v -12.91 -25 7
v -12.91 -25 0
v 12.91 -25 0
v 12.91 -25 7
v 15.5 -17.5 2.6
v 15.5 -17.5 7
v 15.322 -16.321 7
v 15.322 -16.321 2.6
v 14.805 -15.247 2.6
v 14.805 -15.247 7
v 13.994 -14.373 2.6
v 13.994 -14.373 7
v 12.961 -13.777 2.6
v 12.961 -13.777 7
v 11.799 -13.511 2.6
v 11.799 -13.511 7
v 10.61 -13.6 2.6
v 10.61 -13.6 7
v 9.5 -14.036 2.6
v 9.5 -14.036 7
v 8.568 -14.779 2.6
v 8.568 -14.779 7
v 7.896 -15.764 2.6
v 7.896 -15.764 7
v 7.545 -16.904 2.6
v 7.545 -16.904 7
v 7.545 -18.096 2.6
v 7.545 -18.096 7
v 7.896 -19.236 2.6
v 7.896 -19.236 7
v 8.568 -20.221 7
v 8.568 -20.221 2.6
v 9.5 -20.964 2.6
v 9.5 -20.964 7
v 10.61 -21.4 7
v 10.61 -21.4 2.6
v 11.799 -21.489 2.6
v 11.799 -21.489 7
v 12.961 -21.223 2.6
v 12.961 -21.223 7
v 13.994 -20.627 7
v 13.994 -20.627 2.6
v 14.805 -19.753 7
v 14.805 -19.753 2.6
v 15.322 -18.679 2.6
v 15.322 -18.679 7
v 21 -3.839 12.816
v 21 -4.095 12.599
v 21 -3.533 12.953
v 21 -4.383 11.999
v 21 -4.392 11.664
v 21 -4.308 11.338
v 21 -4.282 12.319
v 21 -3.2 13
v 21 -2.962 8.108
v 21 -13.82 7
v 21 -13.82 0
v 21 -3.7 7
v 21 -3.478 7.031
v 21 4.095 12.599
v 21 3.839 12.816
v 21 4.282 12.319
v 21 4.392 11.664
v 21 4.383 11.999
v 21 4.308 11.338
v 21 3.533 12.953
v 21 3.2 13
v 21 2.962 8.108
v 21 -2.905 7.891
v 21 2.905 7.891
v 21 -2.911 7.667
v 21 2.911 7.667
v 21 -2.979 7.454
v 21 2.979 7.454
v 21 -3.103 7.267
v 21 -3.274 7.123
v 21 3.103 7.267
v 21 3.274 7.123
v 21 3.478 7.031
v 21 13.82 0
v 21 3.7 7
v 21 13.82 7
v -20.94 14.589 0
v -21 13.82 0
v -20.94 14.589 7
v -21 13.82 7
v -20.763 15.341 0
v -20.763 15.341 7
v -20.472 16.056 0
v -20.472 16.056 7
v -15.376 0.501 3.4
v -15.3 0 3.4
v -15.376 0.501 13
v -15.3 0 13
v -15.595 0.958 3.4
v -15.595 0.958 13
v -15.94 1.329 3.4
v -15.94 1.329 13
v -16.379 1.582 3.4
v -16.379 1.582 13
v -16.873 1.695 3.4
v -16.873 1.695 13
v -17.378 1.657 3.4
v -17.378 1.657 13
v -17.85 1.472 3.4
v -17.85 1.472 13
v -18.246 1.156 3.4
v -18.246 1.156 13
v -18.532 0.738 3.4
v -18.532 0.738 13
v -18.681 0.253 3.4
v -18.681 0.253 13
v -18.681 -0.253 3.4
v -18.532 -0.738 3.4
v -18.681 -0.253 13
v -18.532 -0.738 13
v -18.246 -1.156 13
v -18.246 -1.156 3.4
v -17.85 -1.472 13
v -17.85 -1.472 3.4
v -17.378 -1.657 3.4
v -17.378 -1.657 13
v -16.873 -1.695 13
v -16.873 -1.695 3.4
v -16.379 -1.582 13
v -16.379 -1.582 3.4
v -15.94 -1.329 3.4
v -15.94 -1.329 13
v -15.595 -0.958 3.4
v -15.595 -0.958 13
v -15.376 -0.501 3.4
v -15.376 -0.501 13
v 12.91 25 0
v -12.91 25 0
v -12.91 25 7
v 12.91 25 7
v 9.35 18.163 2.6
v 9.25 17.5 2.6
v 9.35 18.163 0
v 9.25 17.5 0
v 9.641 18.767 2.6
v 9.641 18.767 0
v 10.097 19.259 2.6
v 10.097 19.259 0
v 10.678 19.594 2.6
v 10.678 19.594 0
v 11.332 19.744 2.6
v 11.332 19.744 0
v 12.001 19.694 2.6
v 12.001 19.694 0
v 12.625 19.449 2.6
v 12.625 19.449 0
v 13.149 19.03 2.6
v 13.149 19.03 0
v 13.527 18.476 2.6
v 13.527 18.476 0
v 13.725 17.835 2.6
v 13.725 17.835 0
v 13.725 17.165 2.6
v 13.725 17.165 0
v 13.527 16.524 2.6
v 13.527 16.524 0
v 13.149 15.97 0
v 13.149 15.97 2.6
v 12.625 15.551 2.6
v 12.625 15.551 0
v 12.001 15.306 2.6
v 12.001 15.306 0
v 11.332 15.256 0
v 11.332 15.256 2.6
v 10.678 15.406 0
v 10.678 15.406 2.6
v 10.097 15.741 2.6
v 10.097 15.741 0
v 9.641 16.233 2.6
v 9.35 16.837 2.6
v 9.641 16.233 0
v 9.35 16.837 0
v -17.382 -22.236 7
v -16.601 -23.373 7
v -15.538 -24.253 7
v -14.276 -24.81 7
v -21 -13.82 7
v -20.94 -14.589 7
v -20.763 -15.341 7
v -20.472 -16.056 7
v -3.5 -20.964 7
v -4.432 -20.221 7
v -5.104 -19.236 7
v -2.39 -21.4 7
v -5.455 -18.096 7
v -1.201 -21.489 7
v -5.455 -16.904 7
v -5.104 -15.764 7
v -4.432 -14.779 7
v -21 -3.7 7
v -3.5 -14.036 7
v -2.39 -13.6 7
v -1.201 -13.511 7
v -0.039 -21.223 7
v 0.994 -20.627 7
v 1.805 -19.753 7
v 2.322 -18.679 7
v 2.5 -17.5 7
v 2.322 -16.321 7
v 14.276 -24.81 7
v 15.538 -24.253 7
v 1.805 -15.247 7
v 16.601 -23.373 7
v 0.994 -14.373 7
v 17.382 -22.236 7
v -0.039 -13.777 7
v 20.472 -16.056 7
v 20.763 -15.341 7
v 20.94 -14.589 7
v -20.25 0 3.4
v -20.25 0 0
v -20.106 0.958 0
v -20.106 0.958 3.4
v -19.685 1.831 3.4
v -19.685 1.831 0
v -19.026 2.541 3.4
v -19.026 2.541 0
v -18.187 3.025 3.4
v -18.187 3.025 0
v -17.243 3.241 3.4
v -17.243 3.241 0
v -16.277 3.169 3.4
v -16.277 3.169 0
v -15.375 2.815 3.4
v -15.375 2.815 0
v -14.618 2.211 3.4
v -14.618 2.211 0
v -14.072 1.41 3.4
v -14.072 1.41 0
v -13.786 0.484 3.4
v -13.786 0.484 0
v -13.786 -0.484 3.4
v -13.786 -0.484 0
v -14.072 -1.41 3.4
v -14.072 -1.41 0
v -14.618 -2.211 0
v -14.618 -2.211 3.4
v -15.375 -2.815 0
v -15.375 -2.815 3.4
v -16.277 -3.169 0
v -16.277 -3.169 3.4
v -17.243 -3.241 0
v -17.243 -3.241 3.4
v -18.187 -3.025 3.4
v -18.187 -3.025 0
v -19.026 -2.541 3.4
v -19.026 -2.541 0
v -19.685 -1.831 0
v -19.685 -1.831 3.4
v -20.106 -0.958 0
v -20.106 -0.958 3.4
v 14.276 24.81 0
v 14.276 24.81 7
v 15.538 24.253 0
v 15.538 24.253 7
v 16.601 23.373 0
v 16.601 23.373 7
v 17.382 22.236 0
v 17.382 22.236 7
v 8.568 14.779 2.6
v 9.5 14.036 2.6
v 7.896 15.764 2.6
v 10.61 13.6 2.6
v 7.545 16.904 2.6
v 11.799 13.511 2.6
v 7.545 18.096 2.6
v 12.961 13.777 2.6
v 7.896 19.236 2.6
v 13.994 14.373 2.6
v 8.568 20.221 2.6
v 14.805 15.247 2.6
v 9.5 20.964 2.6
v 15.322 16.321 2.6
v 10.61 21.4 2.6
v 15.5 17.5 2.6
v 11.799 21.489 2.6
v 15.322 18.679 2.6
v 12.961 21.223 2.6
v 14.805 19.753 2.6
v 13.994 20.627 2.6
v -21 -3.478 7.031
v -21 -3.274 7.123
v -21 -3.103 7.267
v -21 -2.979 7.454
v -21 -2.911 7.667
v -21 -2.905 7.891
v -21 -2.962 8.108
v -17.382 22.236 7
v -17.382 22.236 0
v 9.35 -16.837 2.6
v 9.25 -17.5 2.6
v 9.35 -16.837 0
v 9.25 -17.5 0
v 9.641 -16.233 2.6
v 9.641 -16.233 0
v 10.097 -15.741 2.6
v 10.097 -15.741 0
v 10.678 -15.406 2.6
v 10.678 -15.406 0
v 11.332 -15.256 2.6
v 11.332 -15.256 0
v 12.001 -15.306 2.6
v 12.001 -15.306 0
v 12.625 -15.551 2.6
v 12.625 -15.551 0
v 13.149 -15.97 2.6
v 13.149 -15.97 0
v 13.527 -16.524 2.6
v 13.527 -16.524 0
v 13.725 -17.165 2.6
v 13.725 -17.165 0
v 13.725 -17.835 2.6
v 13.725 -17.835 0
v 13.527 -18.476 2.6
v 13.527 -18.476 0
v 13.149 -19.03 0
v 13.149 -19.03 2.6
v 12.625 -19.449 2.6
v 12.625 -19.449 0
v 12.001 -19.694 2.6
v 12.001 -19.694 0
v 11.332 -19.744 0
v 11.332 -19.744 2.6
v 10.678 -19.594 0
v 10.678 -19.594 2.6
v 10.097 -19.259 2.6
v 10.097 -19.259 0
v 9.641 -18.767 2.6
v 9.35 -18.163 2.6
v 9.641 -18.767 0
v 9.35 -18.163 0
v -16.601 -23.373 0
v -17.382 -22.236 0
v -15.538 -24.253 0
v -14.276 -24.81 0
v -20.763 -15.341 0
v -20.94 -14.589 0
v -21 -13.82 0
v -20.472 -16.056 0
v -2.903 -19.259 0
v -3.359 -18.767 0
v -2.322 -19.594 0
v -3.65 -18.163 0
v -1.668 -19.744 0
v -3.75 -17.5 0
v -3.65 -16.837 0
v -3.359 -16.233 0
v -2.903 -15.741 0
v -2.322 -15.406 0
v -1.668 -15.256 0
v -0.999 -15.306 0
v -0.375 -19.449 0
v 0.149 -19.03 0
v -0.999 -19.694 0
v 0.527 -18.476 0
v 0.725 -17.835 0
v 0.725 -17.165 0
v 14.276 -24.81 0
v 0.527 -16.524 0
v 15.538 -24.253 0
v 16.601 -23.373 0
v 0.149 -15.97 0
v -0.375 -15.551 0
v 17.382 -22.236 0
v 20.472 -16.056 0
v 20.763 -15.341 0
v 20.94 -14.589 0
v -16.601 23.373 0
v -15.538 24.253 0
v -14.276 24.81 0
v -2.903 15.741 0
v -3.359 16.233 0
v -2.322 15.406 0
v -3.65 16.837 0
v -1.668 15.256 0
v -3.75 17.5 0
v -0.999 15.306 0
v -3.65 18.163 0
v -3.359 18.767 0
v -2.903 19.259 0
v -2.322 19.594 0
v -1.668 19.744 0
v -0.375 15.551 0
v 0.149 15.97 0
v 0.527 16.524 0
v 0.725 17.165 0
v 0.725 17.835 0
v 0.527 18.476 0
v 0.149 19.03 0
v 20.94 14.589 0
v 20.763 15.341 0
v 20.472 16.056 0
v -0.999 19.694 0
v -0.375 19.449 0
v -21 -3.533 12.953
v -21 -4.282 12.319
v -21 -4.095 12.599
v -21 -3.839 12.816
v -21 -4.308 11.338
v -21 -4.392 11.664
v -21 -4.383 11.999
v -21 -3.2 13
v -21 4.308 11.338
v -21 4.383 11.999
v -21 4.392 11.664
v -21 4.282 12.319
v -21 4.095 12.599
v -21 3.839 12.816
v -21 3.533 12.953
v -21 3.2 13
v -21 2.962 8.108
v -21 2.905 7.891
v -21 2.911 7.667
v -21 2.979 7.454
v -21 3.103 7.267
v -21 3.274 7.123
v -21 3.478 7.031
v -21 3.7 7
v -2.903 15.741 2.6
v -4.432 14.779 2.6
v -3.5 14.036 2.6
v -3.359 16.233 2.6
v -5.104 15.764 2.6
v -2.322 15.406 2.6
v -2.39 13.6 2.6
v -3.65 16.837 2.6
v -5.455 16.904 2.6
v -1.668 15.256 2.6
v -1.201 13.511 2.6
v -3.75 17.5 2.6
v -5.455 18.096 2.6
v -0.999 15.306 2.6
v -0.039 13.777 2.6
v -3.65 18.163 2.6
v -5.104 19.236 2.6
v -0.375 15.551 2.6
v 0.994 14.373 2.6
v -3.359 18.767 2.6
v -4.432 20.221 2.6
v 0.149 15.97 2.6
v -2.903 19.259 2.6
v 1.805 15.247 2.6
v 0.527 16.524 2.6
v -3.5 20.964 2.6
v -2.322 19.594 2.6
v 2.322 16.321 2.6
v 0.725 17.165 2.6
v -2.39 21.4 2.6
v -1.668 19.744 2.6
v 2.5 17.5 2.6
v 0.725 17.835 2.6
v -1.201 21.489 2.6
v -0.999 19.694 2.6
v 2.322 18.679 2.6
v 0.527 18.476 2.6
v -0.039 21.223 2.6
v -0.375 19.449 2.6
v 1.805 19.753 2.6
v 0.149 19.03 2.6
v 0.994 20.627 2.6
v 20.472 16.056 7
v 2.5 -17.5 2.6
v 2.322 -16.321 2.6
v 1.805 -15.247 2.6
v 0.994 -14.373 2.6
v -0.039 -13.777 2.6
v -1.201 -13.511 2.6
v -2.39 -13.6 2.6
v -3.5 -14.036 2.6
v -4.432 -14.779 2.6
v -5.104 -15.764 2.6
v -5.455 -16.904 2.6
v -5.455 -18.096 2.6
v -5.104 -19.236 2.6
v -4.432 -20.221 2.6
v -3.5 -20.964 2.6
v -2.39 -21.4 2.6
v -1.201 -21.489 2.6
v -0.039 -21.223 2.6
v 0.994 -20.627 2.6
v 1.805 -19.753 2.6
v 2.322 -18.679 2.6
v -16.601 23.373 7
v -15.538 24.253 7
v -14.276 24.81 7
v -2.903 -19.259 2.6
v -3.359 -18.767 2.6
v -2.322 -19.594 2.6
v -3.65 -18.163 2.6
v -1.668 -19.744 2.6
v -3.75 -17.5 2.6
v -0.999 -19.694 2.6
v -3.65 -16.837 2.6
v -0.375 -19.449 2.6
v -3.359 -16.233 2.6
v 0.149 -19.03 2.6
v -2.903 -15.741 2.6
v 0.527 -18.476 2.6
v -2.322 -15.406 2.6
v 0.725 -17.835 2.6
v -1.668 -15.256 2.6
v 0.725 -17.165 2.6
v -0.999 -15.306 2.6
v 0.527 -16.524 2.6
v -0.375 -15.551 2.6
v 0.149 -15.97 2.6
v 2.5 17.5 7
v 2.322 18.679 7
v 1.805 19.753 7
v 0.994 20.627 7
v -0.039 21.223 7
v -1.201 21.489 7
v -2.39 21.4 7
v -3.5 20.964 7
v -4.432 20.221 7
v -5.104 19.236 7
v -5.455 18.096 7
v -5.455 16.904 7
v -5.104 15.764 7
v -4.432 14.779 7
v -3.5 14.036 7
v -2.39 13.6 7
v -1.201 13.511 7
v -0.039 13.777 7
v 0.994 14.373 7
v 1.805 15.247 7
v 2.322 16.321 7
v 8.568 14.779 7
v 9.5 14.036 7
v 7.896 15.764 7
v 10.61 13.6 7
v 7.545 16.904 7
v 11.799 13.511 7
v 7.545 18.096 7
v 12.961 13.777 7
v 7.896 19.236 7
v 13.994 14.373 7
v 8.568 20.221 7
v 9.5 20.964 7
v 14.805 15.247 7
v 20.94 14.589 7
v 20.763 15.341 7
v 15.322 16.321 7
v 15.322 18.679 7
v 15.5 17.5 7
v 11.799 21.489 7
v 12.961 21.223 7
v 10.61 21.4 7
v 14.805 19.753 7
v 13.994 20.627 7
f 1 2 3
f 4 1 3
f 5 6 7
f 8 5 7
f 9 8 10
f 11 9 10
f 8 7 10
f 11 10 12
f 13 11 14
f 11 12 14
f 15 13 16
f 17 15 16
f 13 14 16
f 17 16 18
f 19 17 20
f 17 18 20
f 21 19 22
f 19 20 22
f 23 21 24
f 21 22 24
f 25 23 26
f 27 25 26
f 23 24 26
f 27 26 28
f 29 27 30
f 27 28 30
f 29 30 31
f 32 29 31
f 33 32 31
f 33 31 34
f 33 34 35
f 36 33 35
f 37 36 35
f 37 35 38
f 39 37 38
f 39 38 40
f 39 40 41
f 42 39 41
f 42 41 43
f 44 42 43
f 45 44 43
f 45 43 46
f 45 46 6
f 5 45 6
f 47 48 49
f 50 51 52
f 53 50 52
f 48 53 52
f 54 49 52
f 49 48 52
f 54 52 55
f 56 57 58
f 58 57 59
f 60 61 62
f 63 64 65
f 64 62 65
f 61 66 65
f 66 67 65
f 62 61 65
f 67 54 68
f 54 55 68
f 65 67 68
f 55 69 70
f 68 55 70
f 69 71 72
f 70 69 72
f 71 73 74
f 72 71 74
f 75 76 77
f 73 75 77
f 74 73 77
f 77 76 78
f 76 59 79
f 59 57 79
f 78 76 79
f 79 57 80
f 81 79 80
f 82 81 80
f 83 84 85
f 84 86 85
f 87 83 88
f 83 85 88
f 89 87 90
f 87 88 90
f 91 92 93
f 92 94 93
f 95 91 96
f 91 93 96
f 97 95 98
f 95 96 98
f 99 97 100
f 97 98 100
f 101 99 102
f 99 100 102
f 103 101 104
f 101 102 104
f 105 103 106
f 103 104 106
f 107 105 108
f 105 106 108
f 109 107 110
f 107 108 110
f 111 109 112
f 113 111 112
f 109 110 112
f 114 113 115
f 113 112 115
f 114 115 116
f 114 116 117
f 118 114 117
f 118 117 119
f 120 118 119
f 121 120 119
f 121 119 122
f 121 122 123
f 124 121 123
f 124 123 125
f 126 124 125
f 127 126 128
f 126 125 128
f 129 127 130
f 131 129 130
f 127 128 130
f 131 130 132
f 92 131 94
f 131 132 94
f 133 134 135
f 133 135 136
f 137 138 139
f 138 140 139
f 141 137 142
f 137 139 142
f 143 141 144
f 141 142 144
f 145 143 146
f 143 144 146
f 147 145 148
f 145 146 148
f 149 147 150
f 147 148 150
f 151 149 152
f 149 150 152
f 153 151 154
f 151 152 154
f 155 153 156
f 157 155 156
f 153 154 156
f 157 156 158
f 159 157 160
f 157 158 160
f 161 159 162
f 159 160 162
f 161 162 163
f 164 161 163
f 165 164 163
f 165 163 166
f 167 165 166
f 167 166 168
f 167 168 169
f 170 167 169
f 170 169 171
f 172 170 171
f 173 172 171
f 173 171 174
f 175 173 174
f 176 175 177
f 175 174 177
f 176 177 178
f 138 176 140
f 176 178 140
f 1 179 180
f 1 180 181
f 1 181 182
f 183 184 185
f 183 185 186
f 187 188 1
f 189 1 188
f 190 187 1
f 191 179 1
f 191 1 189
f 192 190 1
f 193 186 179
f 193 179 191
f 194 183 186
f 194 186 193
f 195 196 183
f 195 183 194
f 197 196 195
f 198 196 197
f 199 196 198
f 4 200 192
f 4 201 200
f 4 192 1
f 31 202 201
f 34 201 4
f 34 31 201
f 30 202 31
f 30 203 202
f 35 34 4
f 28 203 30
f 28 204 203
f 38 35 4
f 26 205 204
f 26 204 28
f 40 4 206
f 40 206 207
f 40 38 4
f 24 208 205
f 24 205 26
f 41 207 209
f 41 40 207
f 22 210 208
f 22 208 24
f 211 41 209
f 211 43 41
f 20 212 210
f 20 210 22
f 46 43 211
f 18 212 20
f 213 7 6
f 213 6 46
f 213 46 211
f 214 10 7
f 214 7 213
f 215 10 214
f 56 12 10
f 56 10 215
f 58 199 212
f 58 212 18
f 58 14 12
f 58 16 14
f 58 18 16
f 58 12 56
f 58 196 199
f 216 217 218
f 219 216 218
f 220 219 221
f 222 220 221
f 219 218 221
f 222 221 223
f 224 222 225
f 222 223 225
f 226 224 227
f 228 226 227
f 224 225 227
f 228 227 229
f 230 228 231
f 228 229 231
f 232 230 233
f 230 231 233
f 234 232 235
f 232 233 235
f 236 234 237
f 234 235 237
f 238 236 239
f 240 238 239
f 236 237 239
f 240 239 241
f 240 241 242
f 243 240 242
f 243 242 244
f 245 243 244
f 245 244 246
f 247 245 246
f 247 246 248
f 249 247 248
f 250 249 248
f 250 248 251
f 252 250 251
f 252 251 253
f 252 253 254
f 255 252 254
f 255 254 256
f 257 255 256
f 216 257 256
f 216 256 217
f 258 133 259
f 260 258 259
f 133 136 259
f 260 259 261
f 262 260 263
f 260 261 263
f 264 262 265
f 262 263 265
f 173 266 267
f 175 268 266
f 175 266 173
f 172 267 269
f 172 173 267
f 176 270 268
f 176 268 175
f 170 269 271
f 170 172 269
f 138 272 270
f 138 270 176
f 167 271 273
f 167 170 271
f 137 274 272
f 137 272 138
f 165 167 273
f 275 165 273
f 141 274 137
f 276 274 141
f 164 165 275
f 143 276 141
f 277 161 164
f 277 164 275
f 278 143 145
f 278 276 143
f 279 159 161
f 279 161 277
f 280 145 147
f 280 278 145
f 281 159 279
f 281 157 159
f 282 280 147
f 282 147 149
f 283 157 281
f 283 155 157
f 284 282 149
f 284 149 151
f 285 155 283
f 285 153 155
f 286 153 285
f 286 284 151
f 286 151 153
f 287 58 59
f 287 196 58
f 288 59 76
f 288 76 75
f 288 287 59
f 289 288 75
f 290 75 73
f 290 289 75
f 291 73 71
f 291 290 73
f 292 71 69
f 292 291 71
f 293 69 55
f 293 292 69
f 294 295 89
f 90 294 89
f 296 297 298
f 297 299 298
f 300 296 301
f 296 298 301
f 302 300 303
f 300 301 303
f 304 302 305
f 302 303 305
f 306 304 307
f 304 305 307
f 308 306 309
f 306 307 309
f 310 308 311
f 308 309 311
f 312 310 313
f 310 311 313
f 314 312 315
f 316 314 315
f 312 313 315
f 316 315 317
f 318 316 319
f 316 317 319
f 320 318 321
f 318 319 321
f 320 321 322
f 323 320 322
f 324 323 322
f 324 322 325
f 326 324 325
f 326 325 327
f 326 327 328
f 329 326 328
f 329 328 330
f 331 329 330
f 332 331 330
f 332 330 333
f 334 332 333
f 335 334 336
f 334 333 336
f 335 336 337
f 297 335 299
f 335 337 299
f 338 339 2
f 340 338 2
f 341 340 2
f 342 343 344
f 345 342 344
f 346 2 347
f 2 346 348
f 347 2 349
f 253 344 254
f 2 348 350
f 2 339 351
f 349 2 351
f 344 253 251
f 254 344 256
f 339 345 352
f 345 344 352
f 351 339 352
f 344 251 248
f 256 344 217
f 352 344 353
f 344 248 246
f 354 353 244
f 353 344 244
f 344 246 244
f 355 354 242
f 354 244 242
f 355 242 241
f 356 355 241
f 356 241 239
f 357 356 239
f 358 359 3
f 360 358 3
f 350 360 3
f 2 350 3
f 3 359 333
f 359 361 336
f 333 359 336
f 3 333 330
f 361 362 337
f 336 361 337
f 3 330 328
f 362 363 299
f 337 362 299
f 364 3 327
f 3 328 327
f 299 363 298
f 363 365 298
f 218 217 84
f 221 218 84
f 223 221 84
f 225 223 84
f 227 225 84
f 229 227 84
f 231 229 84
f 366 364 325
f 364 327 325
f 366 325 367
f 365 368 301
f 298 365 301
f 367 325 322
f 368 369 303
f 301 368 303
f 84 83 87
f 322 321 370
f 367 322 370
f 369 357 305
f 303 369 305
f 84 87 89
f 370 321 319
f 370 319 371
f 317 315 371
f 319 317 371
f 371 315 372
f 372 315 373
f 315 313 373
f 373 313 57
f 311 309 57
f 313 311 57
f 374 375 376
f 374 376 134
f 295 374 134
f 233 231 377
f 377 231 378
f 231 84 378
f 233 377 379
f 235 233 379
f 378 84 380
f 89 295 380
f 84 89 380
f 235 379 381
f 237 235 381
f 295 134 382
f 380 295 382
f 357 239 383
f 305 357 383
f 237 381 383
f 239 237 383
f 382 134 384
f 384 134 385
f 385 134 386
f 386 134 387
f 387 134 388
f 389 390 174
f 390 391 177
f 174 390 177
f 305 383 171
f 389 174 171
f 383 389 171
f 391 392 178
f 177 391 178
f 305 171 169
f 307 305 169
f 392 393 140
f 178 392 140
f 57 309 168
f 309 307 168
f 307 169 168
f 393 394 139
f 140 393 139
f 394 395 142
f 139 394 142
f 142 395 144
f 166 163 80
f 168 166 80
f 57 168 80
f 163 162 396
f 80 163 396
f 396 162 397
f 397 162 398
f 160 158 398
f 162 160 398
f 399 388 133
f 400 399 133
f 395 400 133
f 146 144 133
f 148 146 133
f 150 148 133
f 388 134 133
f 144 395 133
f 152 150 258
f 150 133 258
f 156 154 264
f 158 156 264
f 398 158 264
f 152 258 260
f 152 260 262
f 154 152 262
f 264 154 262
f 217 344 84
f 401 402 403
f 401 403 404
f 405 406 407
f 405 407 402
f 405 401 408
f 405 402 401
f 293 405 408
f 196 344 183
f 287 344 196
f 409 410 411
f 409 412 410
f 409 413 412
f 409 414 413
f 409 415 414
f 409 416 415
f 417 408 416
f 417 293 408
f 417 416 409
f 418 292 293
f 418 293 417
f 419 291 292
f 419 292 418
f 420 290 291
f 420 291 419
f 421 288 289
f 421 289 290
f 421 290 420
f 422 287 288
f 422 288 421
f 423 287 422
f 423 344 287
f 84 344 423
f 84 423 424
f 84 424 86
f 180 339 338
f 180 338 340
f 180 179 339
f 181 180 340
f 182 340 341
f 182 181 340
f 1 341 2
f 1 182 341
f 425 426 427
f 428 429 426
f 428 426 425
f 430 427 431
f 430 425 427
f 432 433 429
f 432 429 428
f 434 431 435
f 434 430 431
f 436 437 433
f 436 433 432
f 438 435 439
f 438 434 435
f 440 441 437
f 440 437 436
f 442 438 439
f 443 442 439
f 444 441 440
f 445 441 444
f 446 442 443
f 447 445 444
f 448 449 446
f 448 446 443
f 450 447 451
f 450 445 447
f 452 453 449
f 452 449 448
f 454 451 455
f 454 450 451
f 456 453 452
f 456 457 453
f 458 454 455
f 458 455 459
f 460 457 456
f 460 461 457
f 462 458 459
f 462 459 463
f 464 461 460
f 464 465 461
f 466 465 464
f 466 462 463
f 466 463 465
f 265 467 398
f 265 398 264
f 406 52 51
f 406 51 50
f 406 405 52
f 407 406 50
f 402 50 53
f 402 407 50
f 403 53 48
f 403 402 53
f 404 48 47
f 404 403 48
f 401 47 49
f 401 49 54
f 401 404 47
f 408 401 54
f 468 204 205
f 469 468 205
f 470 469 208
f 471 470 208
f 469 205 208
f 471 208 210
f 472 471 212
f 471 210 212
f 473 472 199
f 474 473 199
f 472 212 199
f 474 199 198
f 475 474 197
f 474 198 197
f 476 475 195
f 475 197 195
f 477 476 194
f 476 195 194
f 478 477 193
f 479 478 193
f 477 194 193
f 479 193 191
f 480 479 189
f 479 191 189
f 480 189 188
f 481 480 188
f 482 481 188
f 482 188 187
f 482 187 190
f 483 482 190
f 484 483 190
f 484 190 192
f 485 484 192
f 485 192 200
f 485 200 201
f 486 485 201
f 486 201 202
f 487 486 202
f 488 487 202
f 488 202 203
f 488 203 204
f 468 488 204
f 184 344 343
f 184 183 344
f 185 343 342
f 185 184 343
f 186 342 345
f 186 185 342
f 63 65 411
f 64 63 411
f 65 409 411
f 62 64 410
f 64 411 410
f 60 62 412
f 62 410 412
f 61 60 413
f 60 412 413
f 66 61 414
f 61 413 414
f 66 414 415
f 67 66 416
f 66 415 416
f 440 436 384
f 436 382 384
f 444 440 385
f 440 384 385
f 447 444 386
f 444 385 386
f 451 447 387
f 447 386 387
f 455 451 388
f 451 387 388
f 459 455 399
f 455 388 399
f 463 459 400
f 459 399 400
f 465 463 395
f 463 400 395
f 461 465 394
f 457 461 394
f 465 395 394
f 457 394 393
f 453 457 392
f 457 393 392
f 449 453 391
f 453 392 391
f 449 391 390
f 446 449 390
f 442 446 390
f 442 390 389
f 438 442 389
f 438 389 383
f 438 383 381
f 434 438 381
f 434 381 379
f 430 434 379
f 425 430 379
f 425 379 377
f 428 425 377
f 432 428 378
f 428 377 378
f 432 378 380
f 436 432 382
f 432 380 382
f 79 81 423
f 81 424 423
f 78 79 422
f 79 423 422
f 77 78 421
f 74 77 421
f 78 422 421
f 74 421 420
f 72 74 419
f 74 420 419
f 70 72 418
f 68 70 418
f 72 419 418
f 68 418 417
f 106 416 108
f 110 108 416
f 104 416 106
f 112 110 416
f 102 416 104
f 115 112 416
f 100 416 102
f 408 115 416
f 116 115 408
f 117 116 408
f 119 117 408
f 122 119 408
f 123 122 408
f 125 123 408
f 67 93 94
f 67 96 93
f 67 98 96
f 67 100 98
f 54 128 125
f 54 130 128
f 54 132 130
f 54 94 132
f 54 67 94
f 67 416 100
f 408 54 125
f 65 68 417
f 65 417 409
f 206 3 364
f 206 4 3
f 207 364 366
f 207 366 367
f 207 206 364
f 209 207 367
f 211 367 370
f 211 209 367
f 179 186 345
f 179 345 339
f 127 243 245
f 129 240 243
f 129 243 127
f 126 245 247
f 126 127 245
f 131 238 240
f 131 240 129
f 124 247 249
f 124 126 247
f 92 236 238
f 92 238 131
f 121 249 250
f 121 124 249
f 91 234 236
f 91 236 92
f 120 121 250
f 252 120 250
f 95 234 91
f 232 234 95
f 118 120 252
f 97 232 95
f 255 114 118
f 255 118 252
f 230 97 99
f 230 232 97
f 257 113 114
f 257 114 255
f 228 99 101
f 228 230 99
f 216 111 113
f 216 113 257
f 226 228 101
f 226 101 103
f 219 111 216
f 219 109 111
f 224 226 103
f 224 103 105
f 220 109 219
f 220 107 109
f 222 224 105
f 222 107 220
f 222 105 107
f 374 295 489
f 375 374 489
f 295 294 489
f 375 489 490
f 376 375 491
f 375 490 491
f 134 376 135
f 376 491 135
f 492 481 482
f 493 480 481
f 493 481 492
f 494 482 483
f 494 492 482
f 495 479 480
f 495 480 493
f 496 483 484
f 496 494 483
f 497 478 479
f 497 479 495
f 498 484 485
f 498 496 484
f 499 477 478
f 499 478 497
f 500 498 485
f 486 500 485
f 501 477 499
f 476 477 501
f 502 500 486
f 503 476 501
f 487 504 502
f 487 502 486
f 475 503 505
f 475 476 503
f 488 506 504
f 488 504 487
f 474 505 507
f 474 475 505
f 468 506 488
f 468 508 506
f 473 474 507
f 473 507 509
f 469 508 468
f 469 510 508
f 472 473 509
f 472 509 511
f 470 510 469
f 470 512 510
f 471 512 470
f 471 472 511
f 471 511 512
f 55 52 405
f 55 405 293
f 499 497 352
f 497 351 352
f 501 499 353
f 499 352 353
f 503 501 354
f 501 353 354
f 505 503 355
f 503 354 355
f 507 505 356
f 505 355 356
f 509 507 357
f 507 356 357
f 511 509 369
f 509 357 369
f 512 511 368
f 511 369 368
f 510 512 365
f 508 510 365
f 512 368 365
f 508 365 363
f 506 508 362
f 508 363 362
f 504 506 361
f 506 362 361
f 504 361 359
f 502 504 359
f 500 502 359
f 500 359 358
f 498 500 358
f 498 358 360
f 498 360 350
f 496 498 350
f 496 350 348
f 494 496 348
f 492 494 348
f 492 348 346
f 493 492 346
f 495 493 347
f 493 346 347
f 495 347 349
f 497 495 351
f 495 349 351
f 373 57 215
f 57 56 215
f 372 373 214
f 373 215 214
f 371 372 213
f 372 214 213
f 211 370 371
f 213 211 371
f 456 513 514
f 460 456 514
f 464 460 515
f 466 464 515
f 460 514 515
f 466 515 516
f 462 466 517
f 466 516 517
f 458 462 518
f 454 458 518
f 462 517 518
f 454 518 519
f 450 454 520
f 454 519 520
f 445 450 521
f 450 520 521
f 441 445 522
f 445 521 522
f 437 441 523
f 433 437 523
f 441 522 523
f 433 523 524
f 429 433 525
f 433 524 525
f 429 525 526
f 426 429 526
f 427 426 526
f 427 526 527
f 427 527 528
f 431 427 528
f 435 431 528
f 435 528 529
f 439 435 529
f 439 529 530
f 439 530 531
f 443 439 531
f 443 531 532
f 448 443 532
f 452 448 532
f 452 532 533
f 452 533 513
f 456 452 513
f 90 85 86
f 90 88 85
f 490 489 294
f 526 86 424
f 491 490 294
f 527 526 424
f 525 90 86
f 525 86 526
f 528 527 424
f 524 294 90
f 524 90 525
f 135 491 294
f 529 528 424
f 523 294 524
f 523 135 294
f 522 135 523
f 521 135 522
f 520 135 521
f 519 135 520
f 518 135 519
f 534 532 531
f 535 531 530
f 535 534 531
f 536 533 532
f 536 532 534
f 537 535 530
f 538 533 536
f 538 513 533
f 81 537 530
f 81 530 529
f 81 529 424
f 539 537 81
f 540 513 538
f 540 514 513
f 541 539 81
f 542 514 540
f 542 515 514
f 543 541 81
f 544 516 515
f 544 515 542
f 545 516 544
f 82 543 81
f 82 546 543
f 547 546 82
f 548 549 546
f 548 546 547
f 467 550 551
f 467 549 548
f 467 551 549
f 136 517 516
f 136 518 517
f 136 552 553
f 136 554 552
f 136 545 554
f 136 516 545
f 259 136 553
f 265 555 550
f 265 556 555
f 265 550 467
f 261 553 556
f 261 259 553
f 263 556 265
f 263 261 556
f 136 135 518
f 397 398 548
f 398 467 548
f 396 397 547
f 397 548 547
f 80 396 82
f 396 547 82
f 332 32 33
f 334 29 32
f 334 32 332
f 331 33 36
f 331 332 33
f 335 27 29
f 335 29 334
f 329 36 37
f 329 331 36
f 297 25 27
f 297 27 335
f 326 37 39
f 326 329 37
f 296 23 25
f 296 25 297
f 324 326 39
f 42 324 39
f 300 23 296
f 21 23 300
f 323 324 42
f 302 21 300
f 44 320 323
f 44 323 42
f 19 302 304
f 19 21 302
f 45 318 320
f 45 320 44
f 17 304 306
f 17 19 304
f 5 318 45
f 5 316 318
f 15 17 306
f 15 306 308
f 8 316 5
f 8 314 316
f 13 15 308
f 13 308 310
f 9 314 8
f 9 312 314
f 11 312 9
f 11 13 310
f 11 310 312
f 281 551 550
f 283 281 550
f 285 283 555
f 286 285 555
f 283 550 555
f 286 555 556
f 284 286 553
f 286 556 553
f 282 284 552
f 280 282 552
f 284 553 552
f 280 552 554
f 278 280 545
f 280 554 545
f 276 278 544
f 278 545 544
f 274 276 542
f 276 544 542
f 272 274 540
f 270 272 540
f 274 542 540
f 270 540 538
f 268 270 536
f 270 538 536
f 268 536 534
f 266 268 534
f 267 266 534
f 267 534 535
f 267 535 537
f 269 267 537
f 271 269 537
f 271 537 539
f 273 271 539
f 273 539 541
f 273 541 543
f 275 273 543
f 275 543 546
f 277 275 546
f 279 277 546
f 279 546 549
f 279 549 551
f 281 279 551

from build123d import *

# Parameters (mm, degrees)
SKIZZE1_W                                            = 42
SKIZZE1_H                                            = 50
AUFSATZ_LINEAR_AUSTRAGEN1_DEPTH                      = 7
STIRNSENKUNG_F_R_M4_ZYLINDERSCHRAUBE_MIT_D           = 4.5
STIRNSENKUNG_F_R_M4_ZYLINDERSCHRAUBE_MIT_CBORE_D     = 8
STIRNSENKUNG_F_R_M4_ZYLINDERSCHRAUBE_MIT_CBORE_DEPTH = 4.4
AUFSATZ_LINEAR_AUSTRAGEN2_DEPTH                      = 42
VERRUNDUNG1_R                                        = 0.8
SCHNITT_LINEAR_AUSTRAGEN1_DEPTH                      = 14
VERRUNDUNG2_R                                        = 5
VERRUNDUNG3_R                                        = 1.2
STIRNSENKUNG_F_R_M3_ZYLINDERSCHRAUBE_MIT_D           = 3.4
STIRNSENKUNG_F_R_M3_ZYLINDERSCHRAUBE_MIT_CBORE_D     = 6.5
STIRNSENKUNG_F_R_M3_ZYLINDERSCHRAUBE_MIT_CBORE_DEPTH = 3.4


with BuildPart() as part:
    # Skizze1 → Aufsatz-Linear austragen1 (new body)
    with BuildSketch(Plane.XY):
        Rectangle(SKIZZE1_W, SKIZZE1_H)
    extrude(amount=AUFSATZ_LINEAR_AUSTRAGEN1_DEPTH)

    # Stirnsenkung für M4 Zylinderschraube mit Innensechskant1 (through all)
    with Locations(Plane.XY.offset(7)):
        with Locations((-1.5, 17.5), (11.5, 17.5), (11.5, -17.5), (-1.5, -17.5)):
            CounterBoreHole(STIRNSENKUNG_F_R_M4_ZYLINDERSCHRAUBE_MIT_D / 2, STIRNSENKUNG_F_R_M4_ZYLINDERSCHRAUBE_MIT_CBORE_D / 2, STIRNSENKUNG_F_R_M4_ZYLINDERSCHRAUBE_MIT_CBORE_DEPTH)

    # Skizze4 → Aufsatz-Linear austragen2 (add, through all)
    with BuildSketch(Plane(origin=(21, 0, 0), x_dir=(0, 0, -1), z_dir=(1, 0, 0))):
        Polygon((-7, 2.5), (-13, 5), (-13, -5), (-7, -2.5), align=None)
    extrude(amount=-AUFSATZ_LINEAR_AUSTRAGEN2_DEPTH)

    # Verrundung1
    verrundung1_edges = [part.edges().sort_by_distance(p)[0] for p in [
        (0, 2.5, 7),
        (0, -2.5, 7),
    ]]
    fillet(verrundung1_edges, radius=VERRUNDUNG1_R)

    # Skizze5 → Schnitt-Linear austragen1 (cut, through all)
    with BuildSketch(Plane(origin=(0, 0, 0), x_dir=(-1, 0, 0), z_dir=(0, 0, -1))):
        Polygon((-21, 25), (-21, 15), (-16, 25), align=None)
        Polygon((21, 25), (16, 25), (21, 15), align=None)
        Polygon((-21, -15), (-21, -25), (-16, -25), align=None)
        Polygon((16, -25), (21, -25), (21, -15), align=None)
    extrude(amount=-SCHNITT_LINEAR_AUSTRAGEN1_DEPTH, mode=Mode.SUBTRACT)

    # Verrundung2
    verrundung2_edges = [part.edges().sort_by_distance(p)[0] for p in [
        (16, 25, 3.5),
        (21, 15, 3.5),
        (-21, 15, 3.5),
        (-16, 25, 3.5),
        (21, -15, 3.5),
        (16, -25, 3.5),
        (-16, -25, 3.5),
        (-21, -15, 3.5),
    ]]
    fillet(verrundung2_edges, radius=VERRUNDUNG2_R)

    # Verrundung3
    verrundung3_edges = [part.edges().sort_by_distance(p)[0] for p in [
        (0, -5, 13),
        (0, 5, 13),
    ]]
    fillet(verrundung3_edges, radius=VERRUNDUNG3_R)

    # Stirnsenkung für M3 Zylinderschraube mit Innensechskant1 (through all)
    with Locations(Plane(origin=(0, 0, 0), x_dir=(-1, 0, 0), z_dir=(0, 0, -1))):
        with Locations((17, 0)):
            CounterBoreHole(STIRNSENKUNG_F_R_M3_ZYLINDERSCHRAUBE_MIT_D / 2, STIRNSENKUNG_F_R_M3_ZYLINDERSCHRAUBE_MIT_CBORE_D / 2, STIRNSENKUNG_F_R_M3_ZYLINDERSCHRAUBE_MIT_CBORE_DEPTH)


solid = part.part
